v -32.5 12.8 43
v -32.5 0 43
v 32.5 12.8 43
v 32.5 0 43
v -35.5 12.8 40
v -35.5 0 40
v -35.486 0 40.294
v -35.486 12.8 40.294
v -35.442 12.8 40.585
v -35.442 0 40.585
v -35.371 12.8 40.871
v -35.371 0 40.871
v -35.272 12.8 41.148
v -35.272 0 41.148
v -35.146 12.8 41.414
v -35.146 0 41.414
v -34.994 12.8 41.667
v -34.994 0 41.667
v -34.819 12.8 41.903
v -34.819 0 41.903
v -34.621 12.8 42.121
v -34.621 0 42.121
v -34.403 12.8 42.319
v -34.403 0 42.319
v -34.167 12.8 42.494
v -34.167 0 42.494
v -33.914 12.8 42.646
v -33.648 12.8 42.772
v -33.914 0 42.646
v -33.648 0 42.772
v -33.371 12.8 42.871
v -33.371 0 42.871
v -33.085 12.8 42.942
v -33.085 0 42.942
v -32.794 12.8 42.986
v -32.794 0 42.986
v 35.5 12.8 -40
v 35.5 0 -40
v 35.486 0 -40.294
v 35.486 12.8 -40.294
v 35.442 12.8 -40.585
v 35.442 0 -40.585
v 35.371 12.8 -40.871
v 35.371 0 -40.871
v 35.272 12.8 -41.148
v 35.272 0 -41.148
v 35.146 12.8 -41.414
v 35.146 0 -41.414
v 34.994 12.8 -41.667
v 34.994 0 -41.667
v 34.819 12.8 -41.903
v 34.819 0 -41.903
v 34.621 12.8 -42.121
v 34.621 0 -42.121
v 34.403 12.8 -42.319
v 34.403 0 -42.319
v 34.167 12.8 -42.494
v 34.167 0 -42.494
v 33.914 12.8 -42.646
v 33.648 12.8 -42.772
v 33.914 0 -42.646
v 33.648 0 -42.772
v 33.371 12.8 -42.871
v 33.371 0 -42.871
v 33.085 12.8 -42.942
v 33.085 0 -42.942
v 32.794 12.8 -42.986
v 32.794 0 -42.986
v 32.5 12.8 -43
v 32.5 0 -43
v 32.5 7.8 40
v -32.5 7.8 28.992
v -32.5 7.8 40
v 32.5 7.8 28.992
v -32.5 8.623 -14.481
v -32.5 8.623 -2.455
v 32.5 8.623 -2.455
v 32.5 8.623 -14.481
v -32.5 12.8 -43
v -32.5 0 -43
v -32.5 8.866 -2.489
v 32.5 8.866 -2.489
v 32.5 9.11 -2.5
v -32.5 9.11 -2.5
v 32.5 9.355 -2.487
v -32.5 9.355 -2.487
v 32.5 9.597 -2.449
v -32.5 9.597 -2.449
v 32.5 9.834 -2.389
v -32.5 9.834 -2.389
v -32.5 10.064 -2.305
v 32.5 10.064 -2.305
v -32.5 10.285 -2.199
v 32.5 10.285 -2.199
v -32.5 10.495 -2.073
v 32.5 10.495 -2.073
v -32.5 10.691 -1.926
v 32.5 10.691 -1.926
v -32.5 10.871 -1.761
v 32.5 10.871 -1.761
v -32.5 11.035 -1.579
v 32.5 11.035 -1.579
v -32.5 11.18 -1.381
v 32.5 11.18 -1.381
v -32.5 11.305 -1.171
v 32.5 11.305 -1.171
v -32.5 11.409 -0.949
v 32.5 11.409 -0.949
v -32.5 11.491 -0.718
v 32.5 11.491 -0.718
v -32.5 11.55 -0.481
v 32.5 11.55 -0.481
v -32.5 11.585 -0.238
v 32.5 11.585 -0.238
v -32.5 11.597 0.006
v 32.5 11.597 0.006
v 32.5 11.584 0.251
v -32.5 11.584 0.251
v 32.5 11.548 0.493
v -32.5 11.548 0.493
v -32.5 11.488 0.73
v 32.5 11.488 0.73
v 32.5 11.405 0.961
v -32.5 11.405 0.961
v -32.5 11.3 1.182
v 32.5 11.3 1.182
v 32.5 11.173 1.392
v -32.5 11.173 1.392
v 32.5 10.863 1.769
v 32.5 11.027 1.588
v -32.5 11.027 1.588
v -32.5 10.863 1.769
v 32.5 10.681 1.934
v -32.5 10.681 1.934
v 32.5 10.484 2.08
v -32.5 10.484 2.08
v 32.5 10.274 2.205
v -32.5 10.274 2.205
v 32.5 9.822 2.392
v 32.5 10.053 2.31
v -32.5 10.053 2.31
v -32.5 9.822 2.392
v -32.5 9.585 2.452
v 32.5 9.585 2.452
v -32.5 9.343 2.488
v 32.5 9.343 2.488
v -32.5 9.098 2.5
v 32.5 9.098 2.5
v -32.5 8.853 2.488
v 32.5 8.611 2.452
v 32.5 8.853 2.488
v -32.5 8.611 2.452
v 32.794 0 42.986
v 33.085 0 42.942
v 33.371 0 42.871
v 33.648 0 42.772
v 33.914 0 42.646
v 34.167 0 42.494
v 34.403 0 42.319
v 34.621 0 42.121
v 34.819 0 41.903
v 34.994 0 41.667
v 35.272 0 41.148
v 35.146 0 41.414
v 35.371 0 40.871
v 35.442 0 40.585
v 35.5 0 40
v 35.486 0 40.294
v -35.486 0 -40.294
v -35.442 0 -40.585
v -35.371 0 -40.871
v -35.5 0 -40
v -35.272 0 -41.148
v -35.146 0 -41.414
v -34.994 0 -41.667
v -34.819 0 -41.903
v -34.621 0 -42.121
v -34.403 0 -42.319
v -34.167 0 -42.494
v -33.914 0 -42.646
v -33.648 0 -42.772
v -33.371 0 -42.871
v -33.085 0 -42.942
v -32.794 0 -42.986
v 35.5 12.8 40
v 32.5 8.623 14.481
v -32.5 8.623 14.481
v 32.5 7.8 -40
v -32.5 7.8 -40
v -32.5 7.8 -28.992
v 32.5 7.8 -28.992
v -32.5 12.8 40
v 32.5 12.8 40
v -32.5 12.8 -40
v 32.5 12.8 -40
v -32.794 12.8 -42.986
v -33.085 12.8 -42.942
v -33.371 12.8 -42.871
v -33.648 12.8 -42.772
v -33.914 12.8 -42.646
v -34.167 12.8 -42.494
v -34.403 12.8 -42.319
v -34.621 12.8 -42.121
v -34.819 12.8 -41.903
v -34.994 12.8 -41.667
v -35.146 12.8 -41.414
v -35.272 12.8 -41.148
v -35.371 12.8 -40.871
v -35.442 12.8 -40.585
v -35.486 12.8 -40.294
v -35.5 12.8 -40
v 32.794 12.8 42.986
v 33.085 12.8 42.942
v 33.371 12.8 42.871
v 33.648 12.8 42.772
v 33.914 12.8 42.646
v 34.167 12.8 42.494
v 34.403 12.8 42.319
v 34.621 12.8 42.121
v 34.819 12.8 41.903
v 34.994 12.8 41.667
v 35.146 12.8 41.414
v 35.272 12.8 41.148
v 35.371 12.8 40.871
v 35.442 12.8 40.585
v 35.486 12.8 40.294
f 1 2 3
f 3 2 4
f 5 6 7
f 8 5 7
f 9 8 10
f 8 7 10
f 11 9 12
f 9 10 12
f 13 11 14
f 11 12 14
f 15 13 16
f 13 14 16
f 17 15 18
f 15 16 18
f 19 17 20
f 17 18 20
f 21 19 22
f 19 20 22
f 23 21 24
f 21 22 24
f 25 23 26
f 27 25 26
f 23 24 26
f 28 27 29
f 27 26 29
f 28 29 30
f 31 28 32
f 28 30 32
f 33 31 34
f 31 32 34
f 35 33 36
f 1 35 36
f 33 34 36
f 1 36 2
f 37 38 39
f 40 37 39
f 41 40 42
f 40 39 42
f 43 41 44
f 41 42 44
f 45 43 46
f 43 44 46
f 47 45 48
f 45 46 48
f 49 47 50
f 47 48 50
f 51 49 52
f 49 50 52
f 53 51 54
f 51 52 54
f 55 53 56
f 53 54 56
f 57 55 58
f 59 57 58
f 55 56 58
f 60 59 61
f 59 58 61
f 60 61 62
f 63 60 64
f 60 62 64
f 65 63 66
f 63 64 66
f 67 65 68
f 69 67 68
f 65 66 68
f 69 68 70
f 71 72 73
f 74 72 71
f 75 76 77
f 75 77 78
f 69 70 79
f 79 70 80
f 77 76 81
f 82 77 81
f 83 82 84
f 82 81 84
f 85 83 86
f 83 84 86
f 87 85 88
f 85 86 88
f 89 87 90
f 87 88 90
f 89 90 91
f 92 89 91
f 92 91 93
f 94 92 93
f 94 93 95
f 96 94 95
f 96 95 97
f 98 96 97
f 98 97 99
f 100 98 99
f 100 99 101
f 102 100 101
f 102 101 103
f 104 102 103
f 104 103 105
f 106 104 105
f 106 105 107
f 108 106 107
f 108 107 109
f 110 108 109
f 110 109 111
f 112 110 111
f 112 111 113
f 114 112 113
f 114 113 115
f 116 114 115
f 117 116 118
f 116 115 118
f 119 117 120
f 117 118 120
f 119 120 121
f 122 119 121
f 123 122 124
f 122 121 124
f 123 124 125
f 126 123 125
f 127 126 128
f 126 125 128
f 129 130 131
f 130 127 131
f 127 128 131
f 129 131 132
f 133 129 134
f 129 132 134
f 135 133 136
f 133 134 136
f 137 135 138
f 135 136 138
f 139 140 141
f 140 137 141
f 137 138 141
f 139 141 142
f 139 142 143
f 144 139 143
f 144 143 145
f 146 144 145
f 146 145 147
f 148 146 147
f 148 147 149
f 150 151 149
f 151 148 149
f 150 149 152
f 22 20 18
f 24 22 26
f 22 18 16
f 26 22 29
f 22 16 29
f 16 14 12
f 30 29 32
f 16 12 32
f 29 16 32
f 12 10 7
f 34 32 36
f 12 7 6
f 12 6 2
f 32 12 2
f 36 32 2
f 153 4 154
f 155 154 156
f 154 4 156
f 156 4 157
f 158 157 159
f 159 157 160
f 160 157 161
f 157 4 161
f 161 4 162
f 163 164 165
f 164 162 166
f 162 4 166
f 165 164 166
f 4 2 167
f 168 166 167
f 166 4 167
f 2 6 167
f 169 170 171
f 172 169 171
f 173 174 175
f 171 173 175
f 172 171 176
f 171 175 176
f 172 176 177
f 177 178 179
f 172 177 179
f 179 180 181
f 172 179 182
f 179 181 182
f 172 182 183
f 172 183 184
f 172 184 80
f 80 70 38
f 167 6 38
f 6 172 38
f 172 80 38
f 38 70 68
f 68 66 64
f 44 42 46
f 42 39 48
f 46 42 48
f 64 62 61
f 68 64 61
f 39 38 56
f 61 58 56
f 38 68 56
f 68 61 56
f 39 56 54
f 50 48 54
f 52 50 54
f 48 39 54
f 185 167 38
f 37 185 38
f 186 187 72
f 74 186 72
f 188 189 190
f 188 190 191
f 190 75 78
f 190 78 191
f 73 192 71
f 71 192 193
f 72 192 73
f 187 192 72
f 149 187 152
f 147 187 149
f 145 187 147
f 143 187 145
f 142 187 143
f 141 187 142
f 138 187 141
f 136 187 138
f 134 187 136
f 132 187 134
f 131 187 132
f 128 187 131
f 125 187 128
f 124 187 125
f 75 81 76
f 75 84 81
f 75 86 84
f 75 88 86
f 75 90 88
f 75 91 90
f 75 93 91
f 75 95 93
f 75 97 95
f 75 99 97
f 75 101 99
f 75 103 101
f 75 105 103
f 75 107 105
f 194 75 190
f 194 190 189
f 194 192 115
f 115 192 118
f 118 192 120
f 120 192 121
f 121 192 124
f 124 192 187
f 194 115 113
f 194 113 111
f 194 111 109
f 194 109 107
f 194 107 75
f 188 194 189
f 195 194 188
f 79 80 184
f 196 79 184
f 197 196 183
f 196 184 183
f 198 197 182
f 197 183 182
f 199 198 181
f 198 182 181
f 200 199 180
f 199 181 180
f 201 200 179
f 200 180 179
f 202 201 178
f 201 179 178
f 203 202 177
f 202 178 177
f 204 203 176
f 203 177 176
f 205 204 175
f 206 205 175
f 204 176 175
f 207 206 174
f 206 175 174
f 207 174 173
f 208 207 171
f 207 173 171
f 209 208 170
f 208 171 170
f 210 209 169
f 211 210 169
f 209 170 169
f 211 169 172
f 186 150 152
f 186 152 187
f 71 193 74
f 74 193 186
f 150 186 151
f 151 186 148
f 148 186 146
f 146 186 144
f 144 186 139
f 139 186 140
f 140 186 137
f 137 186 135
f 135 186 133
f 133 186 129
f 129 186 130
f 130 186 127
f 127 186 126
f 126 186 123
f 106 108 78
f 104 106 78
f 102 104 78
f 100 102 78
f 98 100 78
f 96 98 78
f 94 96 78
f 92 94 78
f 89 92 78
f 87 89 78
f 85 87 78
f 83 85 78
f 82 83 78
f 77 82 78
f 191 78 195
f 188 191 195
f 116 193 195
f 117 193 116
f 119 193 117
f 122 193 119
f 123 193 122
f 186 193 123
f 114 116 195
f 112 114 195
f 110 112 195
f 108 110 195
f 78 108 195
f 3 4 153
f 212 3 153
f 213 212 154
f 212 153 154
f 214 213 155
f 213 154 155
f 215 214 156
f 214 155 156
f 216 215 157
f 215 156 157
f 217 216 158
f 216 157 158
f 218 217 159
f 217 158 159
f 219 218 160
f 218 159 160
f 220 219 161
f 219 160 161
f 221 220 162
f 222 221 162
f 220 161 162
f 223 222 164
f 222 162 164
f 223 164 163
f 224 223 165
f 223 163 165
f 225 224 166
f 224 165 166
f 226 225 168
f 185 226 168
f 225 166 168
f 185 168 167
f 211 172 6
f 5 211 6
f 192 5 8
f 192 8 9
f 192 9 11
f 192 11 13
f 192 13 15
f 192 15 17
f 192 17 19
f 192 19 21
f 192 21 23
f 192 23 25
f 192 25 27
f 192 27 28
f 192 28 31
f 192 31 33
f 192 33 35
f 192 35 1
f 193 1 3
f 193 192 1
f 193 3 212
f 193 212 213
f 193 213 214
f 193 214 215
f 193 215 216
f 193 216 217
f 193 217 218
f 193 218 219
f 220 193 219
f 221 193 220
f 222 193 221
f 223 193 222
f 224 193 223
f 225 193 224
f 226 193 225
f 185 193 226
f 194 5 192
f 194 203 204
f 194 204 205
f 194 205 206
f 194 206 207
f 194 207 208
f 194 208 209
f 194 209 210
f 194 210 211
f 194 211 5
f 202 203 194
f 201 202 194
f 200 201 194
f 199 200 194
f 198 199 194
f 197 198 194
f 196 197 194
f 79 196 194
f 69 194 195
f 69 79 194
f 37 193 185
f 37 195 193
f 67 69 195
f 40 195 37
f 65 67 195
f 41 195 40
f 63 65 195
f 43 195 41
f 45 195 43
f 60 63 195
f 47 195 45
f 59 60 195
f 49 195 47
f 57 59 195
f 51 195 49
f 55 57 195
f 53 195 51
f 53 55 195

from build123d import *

# Parameters (mm, degrees)
BOSS_EXTRUDE1_DEPTH = 12.8
SKETCH2_W           = 65
SKETCH2_H           = 80
CUT_EXTRUDE1_DEPTH  = 5
SKETCH3_R           = 2.5
BOSS_EXTRUDE2_DEPTH = 65
BOSS_EXTRUDE3_START = 65
BOSS_EXTRUDE3_DEPTH = 65


with BuildPart() as part:
    # Sketch1 → Boss-Extrude1 (new body)
    with BuildSketch(Plane(origin=(0, 0, 0), x_dir=(1, 0, 0), z_dir=(0, 1, 0))):
        with BuildLine():
            Line((-32.5, -43), (32.5, -43))
            ThreePointArc((32.5, -43), (34.621320344, -42.121320344), (35.5, -40))
            Line((35.5, -40), (35.5, 40))
            ThreePointArc((35.5, 40), (34.621320344, 42.121320344), (32.5, 43))
            Line((32.5, 43), (-32.5, 43))
            ThreePointArc((-32.5, 43), (-34.621320344, 42.121320344), (-35.5, 40))
            Line((-35.5, 40), (-35.5, -40))
            ThreePointArc((-35.5, -40), (-34.621320344, -42.121320344), (-32.5, -43))
        make_face()
    extrude(amount=BOSS_EXTRUDE1_DEPTH)

    # Sketch2 → Cut-Extrude1 (cut)
    with BuildSketch(Plane(origin=(0, 12.8, 0), x_dir=(1, 0, 0), z_dir=(0, 1, 0))):
        Rectangle(SKETCH2_W, SKETCH2_H)
    extrude(amount=-CUT_EXTRUDE1_DEPTH, mode=Mode.SUBTRACT)

    # Sketch3 → Boss-Extrude2 (add)
    with BuildSketch(Plane(origin=(-32.5, 0, 0), x_dir=(0, 0, -1), z_dir=(1, 0, 0))):
        with Locations((0, 9.096601027)):
            Circle(SKETCH3_R)
    extrude(amount=BOSS_EXTRUDE2_DEPTH)

    # Sketch4 → Boss-Extrude3 (add)
    with BuildSketch(Plane.ZY.offset(-32.5).offset(BOSS_EXTRUDE3_START)):
        with BuildLine():
            Line((-2.454816759, 8.623447059), (-14.48112221, 8.623447059))
            Line((-14.48112221, 8.623447059), (-28.991763091, 7.8))
            Line((-28.991763091, 7.8), (-2.137481176, 7.8))
            ThreePointArc((-2.137481176, 7.8), (-2.332770101, 8.197610675), (-2.454816759, 8.623447059))
        make_face()
        with BuildLine():
            Line((2.452414649, 8.611150321), (14.48112221, 8.623447059))
            Line((14.48112221, 8.623447059), (28.991763091, 7.8))
            Line((28.991763091, 7.8), (2.137481176, 7.8))
            ThreePointArc((2.137481176, 7.8), (2.330510058, 8.191767966), (2.452414649, 8.611150321))
        make_face()
    extrude(amount=-BOSS_EXTRUDE3_DEPTH)


solid = part.part
